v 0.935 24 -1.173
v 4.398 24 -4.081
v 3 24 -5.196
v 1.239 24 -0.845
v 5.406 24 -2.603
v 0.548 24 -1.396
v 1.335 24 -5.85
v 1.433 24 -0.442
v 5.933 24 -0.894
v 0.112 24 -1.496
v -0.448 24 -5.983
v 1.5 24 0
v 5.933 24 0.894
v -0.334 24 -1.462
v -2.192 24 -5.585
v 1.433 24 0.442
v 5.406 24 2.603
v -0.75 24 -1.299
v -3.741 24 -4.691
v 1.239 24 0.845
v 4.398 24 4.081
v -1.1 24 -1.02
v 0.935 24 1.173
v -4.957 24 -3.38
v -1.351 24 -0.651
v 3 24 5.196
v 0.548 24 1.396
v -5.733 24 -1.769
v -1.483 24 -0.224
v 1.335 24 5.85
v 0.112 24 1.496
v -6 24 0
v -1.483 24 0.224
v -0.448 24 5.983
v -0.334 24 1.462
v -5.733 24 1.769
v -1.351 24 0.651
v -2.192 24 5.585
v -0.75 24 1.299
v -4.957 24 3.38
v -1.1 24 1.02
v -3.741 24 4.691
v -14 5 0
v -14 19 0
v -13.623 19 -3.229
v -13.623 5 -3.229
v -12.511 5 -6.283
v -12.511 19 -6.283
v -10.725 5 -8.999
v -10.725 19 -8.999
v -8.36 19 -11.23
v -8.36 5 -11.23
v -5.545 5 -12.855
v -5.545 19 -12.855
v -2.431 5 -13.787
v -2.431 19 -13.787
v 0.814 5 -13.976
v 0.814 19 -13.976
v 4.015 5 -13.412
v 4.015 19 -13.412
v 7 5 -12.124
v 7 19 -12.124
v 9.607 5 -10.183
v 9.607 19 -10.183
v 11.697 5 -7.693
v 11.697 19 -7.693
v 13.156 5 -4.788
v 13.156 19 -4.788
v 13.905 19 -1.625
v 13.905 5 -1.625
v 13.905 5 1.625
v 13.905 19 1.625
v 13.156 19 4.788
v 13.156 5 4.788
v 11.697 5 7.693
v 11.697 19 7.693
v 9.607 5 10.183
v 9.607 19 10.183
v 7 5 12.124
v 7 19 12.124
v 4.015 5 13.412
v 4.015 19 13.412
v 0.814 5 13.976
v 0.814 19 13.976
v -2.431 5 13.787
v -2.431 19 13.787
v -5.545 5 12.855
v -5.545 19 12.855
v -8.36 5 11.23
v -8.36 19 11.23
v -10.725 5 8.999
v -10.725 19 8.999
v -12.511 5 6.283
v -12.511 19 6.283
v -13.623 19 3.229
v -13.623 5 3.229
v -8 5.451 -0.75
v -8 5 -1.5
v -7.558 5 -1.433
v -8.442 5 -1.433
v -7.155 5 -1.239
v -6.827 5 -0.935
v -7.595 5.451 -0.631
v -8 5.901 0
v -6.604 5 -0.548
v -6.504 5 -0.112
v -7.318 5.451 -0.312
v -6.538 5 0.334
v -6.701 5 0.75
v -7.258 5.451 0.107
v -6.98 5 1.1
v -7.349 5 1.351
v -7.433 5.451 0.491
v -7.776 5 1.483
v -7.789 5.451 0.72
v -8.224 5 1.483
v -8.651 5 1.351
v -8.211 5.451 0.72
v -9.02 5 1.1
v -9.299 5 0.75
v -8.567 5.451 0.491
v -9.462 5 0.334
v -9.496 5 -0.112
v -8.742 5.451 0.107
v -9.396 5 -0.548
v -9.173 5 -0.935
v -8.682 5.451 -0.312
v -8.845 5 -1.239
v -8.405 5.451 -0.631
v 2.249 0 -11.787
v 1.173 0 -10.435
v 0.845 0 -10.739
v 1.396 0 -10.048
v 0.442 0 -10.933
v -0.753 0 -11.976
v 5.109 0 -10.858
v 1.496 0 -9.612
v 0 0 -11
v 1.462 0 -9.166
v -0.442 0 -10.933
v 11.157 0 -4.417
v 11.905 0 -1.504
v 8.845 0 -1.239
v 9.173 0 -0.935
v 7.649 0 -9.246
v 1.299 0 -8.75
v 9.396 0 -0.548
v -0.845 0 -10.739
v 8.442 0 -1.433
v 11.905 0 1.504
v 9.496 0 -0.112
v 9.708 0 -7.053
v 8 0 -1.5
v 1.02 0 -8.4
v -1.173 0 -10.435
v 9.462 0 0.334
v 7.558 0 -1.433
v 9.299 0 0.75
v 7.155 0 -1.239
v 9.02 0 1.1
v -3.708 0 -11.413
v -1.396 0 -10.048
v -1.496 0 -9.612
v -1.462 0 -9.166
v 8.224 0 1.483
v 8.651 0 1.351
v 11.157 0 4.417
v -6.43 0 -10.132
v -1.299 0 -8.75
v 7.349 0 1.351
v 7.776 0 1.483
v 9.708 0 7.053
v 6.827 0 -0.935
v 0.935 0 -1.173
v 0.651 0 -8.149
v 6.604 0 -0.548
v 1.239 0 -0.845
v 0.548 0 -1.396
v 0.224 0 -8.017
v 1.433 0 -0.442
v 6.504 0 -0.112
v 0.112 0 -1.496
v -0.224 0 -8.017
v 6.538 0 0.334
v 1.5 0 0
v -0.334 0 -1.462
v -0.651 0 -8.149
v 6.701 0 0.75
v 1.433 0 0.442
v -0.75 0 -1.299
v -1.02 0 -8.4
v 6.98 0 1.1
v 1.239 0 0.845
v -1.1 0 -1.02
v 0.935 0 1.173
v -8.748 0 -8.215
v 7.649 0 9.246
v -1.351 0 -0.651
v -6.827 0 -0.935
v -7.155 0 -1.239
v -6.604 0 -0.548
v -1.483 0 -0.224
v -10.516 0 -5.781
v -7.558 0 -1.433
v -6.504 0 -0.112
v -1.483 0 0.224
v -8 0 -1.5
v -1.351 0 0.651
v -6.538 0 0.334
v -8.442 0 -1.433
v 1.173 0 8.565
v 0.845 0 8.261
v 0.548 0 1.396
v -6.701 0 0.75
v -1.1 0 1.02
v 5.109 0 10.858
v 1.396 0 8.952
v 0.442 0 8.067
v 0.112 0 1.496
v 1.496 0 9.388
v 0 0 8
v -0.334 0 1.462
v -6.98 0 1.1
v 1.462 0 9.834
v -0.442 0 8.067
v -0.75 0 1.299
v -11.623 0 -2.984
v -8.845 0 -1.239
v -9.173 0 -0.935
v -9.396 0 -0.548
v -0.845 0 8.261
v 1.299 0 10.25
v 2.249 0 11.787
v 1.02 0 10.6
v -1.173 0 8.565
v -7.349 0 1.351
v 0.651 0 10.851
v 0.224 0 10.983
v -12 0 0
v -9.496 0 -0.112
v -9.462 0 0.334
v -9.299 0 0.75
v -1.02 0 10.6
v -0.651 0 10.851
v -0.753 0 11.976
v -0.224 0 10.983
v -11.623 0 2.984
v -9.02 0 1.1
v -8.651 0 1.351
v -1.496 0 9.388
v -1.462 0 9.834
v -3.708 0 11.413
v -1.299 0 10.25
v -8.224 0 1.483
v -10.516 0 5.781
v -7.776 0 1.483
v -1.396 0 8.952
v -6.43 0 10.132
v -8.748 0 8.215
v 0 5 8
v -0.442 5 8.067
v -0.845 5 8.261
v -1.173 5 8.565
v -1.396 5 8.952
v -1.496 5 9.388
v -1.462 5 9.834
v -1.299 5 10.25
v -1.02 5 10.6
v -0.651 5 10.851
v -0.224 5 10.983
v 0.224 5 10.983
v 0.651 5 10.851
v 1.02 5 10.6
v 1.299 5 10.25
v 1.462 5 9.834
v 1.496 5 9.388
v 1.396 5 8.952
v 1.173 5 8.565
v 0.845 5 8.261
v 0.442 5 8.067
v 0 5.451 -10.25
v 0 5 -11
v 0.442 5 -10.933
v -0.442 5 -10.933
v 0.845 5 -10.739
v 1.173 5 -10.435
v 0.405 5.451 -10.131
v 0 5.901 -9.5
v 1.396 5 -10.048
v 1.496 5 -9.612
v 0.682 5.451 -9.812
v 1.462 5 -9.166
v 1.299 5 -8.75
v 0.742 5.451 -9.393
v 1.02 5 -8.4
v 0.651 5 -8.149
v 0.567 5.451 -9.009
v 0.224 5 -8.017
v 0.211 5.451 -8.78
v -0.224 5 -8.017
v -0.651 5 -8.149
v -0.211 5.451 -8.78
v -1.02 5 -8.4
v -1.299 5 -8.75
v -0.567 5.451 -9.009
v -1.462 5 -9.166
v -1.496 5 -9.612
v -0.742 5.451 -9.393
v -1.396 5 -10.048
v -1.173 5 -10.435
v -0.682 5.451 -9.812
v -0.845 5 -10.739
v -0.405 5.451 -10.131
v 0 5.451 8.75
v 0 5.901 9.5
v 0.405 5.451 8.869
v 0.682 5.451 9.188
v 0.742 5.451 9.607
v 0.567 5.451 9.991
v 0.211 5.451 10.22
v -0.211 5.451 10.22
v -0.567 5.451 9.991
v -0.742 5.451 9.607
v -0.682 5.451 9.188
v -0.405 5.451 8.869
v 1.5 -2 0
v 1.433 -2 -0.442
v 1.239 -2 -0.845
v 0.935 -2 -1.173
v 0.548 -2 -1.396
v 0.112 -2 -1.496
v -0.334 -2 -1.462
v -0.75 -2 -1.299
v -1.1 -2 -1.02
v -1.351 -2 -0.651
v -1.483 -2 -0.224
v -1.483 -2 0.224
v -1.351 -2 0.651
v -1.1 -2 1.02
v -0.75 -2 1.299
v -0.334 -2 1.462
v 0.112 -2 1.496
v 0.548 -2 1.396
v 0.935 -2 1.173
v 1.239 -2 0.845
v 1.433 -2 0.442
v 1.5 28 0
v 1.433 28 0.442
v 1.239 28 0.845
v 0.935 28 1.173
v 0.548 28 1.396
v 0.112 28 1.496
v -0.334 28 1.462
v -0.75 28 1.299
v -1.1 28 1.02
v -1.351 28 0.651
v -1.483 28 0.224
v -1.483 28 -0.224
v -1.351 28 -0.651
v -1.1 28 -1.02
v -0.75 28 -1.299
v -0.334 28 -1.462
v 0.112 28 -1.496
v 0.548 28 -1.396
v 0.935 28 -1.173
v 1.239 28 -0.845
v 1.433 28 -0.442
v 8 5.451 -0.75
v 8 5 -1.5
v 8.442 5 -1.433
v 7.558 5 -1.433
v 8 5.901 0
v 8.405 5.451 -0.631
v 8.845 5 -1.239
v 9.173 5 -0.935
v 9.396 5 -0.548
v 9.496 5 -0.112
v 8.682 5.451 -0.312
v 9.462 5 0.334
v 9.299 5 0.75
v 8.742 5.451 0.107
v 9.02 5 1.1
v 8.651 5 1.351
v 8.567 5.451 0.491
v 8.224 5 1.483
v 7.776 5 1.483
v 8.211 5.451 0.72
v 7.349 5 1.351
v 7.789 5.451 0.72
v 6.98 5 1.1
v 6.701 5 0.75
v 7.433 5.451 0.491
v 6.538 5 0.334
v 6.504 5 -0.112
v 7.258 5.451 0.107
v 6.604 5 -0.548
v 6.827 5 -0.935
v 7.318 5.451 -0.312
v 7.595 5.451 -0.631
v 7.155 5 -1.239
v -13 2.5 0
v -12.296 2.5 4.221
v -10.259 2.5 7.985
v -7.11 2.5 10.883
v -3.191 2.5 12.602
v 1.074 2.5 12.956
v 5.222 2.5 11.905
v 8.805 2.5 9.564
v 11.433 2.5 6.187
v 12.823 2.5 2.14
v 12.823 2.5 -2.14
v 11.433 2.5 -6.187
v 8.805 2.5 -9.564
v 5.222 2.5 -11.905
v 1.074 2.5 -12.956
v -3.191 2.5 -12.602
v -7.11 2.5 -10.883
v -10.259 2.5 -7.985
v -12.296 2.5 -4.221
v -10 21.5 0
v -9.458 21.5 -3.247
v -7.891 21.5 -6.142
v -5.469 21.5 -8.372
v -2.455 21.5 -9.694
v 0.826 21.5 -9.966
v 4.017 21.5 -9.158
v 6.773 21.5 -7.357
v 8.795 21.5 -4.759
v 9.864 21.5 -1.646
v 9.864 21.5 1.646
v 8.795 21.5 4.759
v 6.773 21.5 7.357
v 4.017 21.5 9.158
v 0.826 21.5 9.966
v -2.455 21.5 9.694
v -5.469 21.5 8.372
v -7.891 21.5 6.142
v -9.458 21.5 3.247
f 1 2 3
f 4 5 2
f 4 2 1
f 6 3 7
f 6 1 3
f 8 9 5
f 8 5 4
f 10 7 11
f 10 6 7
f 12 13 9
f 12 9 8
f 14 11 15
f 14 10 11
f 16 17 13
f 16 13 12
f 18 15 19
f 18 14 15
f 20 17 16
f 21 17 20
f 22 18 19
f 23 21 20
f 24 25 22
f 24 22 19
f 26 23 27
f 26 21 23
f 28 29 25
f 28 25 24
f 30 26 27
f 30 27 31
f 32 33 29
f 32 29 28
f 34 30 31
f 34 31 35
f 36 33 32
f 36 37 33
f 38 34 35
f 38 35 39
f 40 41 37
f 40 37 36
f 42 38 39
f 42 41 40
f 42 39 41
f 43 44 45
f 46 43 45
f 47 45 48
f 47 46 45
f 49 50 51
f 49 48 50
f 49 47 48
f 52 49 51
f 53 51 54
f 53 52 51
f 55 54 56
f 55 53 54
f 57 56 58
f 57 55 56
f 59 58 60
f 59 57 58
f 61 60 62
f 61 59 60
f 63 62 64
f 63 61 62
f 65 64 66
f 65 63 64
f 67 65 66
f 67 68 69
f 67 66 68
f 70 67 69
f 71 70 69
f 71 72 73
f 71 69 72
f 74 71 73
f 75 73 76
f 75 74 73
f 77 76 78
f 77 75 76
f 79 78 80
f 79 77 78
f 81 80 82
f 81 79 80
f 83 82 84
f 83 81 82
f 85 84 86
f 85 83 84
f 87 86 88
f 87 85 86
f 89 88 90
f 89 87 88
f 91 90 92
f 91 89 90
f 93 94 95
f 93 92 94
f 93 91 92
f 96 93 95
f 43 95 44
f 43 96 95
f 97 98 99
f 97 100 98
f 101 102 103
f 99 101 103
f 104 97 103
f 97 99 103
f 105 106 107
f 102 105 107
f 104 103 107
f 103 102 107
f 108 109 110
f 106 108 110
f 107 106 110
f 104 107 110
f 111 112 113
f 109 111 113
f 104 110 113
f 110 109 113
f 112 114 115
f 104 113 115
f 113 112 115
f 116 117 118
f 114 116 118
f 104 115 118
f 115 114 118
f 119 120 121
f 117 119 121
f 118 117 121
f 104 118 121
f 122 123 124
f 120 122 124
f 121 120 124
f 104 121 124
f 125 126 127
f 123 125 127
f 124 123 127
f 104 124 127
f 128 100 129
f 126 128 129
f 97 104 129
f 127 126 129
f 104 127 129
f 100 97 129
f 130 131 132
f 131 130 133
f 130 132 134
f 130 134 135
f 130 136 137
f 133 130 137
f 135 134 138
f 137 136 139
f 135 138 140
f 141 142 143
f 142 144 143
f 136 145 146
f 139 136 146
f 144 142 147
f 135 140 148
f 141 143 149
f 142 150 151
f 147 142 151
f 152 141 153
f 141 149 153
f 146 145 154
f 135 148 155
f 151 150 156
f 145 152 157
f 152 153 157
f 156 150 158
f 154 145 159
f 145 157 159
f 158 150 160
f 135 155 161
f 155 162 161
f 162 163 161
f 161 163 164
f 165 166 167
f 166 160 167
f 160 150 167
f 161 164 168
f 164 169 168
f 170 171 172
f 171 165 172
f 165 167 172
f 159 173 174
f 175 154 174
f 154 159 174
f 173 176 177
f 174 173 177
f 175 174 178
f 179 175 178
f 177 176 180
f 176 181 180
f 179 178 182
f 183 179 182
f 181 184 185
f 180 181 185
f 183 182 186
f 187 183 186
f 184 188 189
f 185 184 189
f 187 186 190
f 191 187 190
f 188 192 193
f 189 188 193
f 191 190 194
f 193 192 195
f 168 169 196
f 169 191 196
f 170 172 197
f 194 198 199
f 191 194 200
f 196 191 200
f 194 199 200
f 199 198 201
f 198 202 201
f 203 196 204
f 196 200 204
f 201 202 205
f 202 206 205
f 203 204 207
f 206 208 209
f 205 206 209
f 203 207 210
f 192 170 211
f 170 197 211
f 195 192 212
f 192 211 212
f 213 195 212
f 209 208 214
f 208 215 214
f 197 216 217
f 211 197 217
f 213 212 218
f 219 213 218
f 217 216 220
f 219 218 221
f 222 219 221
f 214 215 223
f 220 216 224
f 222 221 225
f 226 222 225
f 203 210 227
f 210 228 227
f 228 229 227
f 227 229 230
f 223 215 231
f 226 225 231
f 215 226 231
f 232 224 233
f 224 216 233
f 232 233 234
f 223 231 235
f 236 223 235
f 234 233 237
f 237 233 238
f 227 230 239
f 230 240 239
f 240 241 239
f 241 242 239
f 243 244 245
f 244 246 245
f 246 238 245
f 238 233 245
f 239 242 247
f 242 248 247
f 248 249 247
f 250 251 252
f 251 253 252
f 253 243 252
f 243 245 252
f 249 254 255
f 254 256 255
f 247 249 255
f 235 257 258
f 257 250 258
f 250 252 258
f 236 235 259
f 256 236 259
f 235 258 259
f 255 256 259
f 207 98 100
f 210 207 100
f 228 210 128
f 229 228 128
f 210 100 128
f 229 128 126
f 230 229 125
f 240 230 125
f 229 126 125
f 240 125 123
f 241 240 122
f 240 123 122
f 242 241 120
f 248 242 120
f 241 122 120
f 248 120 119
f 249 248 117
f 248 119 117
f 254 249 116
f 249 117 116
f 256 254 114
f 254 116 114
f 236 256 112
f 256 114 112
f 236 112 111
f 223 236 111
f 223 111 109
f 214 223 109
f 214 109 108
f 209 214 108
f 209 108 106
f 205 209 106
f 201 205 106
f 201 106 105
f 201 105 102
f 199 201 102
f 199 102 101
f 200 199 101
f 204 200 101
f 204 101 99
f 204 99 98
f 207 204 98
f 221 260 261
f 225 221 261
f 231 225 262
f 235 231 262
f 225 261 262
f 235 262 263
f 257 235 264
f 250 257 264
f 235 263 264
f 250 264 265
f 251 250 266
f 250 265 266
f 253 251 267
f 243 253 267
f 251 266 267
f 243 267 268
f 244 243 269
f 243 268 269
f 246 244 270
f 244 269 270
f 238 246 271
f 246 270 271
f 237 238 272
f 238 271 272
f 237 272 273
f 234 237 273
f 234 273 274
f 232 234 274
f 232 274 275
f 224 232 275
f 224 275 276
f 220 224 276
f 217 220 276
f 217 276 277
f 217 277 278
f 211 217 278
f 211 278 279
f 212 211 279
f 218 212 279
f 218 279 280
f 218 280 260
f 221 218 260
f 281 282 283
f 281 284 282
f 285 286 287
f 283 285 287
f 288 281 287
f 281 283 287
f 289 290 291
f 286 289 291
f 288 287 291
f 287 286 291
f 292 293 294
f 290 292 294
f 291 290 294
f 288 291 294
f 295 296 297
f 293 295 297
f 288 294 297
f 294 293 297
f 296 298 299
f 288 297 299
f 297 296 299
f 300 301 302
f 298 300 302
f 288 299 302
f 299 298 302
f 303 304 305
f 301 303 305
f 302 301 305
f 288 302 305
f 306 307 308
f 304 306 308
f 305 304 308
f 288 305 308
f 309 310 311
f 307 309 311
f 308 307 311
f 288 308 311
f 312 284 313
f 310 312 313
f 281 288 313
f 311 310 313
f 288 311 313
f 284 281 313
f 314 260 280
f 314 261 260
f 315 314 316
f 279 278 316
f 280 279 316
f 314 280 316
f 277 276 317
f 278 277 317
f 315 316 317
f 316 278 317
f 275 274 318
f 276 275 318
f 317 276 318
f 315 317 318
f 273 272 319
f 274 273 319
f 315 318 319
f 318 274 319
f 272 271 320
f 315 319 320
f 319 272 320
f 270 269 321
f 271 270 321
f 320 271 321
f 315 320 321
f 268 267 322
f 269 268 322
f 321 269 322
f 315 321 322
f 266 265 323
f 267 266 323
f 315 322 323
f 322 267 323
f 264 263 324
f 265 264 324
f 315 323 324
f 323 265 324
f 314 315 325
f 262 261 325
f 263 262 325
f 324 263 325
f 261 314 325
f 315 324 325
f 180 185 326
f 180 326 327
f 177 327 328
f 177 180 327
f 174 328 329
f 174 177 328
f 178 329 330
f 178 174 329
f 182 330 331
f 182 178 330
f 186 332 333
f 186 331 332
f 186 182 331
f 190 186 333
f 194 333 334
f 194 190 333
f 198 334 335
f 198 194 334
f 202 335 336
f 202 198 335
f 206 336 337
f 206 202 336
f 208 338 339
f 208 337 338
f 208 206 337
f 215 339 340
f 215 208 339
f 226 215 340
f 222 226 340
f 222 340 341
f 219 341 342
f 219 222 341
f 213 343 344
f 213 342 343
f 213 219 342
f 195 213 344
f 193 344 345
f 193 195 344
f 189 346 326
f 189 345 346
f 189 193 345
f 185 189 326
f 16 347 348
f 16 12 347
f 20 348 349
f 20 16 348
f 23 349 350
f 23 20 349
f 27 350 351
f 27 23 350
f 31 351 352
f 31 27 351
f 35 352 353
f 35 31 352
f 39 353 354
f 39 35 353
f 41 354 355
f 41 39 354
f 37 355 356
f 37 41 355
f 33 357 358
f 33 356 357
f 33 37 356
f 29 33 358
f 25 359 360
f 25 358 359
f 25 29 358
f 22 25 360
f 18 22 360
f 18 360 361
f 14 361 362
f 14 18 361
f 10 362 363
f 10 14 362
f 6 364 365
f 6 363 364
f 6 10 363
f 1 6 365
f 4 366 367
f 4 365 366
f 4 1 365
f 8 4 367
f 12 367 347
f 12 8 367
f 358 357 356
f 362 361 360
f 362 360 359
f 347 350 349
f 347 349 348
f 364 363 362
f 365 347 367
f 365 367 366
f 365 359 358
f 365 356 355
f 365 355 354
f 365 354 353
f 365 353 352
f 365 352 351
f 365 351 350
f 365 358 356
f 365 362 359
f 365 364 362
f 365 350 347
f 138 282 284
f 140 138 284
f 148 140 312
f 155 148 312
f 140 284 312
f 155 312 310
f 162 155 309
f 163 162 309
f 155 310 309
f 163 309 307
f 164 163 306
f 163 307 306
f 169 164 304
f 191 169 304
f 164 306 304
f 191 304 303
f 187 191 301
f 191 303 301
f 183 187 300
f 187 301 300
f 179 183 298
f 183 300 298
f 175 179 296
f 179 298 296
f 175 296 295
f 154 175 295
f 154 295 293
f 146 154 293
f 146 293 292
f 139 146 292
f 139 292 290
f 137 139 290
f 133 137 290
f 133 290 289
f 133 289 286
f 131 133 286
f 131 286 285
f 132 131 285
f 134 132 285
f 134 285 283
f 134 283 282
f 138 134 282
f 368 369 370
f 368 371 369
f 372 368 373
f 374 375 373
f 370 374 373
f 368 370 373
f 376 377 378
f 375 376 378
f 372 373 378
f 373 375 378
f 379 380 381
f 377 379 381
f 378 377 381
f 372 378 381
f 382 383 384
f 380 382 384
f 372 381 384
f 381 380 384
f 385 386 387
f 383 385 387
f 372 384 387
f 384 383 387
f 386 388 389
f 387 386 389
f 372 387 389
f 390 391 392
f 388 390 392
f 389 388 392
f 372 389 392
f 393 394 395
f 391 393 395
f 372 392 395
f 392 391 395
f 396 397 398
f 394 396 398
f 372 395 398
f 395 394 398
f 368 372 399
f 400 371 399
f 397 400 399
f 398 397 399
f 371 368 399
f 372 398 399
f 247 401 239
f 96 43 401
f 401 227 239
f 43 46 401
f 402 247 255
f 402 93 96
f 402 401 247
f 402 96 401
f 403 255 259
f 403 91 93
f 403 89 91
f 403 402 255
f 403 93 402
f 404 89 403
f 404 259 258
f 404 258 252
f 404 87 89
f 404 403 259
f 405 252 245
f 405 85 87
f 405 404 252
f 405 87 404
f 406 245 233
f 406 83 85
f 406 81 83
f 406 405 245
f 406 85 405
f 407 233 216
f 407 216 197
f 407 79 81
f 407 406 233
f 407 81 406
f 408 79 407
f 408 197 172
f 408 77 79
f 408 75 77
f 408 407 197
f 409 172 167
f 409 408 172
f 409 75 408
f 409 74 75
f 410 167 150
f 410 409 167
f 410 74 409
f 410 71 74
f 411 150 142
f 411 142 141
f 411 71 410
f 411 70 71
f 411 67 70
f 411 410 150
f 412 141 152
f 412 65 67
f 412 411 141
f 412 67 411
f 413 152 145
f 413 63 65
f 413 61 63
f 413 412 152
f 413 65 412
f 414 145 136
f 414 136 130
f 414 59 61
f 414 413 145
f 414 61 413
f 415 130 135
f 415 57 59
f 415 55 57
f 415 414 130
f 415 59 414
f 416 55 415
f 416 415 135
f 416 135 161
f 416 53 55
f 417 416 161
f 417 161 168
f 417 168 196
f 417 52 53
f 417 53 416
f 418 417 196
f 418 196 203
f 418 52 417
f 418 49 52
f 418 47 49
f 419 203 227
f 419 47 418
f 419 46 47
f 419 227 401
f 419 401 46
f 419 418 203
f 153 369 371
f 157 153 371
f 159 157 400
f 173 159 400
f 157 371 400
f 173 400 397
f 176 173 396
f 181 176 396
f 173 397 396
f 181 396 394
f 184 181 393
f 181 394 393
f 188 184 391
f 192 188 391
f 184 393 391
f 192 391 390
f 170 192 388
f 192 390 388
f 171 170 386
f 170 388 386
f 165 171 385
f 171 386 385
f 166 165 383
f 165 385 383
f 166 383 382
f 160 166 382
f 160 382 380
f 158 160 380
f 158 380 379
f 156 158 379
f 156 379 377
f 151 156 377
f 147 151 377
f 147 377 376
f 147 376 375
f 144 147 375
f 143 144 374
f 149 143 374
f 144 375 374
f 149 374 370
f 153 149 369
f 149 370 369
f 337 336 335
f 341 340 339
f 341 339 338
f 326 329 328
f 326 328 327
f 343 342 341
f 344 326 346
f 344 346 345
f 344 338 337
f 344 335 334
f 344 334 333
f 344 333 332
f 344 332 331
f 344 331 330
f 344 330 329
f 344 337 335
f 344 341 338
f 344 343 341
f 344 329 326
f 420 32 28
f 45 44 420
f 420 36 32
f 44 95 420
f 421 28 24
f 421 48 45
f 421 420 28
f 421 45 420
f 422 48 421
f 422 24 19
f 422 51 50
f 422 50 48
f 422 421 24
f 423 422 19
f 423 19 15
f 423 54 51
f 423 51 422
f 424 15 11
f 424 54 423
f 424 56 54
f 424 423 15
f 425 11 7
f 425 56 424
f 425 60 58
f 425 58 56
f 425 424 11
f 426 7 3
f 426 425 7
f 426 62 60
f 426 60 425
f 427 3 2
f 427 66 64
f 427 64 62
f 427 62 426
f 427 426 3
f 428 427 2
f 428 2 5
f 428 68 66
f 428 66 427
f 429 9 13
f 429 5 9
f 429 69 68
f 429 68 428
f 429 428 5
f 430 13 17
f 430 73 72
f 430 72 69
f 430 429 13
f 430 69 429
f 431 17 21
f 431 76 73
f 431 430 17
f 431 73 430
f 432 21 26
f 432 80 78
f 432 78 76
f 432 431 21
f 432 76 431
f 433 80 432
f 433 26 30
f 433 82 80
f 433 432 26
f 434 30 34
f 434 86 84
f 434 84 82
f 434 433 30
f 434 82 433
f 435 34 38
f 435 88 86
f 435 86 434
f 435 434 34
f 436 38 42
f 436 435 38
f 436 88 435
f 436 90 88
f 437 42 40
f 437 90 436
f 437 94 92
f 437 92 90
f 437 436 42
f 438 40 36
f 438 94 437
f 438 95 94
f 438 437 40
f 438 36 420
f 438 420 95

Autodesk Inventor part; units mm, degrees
ref_plane "YZ Plane" through (0, 0, 0) normal (1, 0, 0) x (0, 1, 0)
ref_plane "XZ Plane" through (0, 0, 0) normal (0, 1, 0) x (-1, 0, 0)
ref_plane "XY Plane" through (0, 0, 0) normal (0, 0, 1) x (1, 0, 0)
sketch "Sketch1" plane through (0, 0, 0) normal (0, 1, 0) x (-1, 0, 0)
  circle A0 centre (0, 0) radius 14
  dimension "d0" = 28
extrude "Extrusion1" add sketch "Sketch1" along normal blind 24
chamfer "Chamfer1" distance 2 distance2 5 1 edges at (14, 0, 0) measured on face at (-0.5625, 0, 1.5565)
sketch "Sketch2" plane through (0, 0, 0) normal (0, -1, 0) x (1, 0, 0)
  circle A0 centre (0, 0) radius 9.5
  circle A1 centre (0, 0) radius 8
  line L0 (0, 0) -> (0, 9.5)
  line L1 (0, 0) -> (0, -9.5)
  line L2 (0, 0) -> (8, 0)
  line L3 (0, 0) -> (-8, 0)
  dimension "d6" = 19
  dimension "d7" = 16
hole "Hole1" at (0, 0, 9.5) at (-8, 0, 0) at (8, 0, 0) at (0, 0, -9.5) direction (0, 1, 0) diameter 3 depth 5 tip angle 118
chamfer "Chamfer2" distance 8 distance2 5 1 edges at (14, 24, 0) measured on face at (-0.5625, 24, 1.5565)
sketch "Sketch3" plane through (0, 24, 0) normal (0, 1, 0) x (1, 0, 0)
  circle A0 centre (0, 0) radius 1.5
  dimension "d18" = 3
extrude "Extrusion2" add sketch "Sketch3" along normal blind 4
sketch "Sketch4" plane through (0, 0, 0) normal (0, -1, 0) x (1, 0, 0)
  circle A0 centre (0, 0) radius 1.5
  dimension "d21" = 3
extrude "Extrusion3" add sketch "Sketch4" along normal blind 2
properties part number "motor_generic" material "Aluminum 6061"
